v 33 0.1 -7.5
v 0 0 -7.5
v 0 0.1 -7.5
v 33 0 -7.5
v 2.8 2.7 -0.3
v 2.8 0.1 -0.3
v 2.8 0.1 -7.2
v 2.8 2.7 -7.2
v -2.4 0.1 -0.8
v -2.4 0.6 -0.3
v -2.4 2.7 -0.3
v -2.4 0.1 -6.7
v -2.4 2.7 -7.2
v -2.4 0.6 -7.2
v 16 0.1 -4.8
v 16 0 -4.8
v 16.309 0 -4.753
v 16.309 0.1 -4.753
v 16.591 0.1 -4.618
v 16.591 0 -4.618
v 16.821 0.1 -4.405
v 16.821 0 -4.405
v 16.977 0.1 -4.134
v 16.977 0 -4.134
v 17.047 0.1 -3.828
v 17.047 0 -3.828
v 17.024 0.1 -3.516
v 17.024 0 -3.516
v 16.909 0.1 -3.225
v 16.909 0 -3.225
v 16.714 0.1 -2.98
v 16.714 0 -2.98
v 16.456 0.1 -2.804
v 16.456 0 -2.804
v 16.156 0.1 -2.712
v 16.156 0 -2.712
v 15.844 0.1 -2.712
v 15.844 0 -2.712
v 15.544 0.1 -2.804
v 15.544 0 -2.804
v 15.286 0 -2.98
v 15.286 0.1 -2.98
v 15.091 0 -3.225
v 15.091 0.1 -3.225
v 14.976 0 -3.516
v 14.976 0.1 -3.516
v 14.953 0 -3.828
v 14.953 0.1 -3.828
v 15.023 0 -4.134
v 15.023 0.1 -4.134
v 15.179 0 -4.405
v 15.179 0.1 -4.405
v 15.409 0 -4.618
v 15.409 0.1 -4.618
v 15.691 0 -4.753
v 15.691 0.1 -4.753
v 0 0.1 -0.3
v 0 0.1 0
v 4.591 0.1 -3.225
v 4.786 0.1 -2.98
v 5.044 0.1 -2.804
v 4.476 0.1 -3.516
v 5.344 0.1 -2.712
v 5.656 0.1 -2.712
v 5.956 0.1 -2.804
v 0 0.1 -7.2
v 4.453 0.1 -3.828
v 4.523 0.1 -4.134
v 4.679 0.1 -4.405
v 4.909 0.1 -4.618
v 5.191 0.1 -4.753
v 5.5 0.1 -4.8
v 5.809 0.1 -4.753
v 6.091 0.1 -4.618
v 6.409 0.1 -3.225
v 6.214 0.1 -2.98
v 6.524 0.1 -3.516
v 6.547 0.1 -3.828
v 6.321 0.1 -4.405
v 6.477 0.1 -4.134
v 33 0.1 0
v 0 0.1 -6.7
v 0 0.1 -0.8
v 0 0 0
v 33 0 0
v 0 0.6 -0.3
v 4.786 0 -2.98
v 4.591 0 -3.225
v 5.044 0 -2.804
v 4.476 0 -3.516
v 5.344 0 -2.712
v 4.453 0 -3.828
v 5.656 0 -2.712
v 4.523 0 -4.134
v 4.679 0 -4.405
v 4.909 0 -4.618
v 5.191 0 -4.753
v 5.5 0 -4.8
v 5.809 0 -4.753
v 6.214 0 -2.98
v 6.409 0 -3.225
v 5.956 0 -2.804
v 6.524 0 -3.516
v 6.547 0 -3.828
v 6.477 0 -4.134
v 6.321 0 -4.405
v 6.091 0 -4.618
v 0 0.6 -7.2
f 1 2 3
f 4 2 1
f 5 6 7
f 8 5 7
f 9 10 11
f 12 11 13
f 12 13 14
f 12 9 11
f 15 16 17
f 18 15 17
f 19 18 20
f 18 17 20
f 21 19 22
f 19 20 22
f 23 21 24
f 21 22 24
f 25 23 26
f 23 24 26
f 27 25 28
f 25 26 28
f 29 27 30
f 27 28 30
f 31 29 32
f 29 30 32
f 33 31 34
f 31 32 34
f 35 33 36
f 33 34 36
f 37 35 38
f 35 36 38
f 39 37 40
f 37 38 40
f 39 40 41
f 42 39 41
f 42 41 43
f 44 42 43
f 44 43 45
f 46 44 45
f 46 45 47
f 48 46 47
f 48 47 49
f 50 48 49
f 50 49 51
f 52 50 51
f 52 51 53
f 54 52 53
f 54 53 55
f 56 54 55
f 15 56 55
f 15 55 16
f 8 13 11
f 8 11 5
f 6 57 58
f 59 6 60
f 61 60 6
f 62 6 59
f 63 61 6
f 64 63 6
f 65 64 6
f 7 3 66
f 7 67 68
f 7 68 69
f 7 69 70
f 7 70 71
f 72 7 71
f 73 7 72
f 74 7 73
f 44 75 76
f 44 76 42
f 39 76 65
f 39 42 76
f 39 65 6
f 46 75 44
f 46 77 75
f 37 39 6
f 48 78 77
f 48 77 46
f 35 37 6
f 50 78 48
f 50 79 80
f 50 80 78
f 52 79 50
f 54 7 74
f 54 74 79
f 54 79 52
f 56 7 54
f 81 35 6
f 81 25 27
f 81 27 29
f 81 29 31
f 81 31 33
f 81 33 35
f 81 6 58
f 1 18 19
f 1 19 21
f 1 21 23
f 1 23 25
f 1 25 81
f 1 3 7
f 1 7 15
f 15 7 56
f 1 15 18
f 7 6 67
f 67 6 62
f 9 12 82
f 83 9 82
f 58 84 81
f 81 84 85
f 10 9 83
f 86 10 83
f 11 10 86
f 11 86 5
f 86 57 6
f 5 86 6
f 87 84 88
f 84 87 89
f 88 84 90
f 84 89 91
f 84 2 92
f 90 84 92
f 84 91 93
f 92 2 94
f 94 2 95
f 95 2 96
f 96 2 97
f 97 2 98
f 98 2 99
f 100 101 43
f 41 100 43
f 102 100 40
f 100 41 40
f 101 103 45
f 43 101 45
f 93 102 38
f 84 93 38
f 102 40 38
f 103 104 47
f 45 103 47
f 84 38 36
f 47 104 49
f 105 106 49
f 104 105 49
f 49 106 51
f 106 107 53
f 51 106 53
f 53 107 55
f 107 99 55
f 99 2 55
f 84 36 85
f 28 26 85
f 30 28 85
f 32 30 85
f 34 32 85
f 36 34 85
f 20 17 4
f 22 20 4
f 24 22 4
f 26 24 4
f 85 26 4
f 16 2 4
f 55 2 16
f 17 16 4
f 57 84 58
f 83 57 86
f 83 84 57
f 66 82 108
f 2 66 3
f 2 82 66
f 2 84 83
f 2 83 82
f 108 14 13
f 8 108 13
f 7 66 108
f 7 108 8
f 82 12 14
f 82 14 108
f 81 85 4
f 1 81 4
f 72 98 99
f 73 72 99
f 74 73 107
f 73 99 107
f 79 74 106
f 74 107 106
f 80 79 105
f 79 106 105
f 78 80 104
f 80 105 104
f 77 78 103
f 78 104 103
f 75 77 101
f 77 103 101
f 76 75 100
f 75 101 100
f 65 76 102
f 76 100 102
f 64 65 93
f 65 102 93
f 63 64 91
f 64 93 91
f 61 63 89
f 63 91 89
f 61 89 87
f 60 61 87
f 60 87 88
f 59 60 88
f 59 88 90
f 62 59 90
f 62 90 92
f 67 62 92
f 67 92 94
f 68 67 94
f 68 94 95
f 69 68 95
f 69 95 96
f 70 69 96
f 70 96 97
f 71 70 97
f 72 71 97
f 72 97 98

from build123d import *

# Parameters (mm, degrees)
SKETCH1_W           = 33
SKETCH1_H           = 7.5
BOSS_EXTRUDE1_DEPTH = 0.1
SKETCH2_W           = 5.2
SKETCH2_H           = 6.9
BOSS_EXTRUDE2_DEPTH = 2.6
CHAMFER1_SIZE       = 0.5
SKETCH3_R           = 1.05
CUT_EXTRUDE1_DEPTH  = 2.6


with BuildPart() as part:
    # Sketch1 → Boss-Extrude1 (new body)
    with BuildSketch(Plane(origin=(0, 0, 0), x_dir=(1, 0, 0), z_dir=(0, 1, 0))):
        with Locations((16.5, 3.75)):
            Rectangle(SKETCH1_W, SKETCH1_H)
    extrude(amount=BOSS_EXTRUDE1_DEPTH)

    # Sketch2 → Boss-Extrude2 (add)
    with BuildSketch(Plane(origin=(0, 0.1, 0), x_dir=(1, 0, 0), z_dir=(0, 1, 0))):
        with Locations((0.2, 3.75)):
            Rectangle(SKETCH2_W, SKETCH2_H)
    extrude(amount=BOSS_EXTRUDE2_DEPTH)

    # Chamfer1
    chamfer1_edges = [part.edges().sort_by_distance(p)[0] for p in [
        (-1.2, 0.1, -0.3),
        (-1.2, 0.1, -7.2),
    ]]
    chamfer(chamfer1_edges, length=CHAMFER1_SIZE)

    # Sketch3 → Cut-Extrude1 (cut)
    with BuildSketch(Plane.XZ):
        with Locations(Location((5.5, -3.75, 0), (0, 0, 270))):
            Circle(SKETCH3_R)
        with Locations(Location((16, -3.75, 0), (0, 0, 270))):
            Circle(SKETCH3_R)
    extrude(amount=-CUT_EXTRUDE1_DEPTH, mode=Mode.SUBTRACT)


solid = part.part
